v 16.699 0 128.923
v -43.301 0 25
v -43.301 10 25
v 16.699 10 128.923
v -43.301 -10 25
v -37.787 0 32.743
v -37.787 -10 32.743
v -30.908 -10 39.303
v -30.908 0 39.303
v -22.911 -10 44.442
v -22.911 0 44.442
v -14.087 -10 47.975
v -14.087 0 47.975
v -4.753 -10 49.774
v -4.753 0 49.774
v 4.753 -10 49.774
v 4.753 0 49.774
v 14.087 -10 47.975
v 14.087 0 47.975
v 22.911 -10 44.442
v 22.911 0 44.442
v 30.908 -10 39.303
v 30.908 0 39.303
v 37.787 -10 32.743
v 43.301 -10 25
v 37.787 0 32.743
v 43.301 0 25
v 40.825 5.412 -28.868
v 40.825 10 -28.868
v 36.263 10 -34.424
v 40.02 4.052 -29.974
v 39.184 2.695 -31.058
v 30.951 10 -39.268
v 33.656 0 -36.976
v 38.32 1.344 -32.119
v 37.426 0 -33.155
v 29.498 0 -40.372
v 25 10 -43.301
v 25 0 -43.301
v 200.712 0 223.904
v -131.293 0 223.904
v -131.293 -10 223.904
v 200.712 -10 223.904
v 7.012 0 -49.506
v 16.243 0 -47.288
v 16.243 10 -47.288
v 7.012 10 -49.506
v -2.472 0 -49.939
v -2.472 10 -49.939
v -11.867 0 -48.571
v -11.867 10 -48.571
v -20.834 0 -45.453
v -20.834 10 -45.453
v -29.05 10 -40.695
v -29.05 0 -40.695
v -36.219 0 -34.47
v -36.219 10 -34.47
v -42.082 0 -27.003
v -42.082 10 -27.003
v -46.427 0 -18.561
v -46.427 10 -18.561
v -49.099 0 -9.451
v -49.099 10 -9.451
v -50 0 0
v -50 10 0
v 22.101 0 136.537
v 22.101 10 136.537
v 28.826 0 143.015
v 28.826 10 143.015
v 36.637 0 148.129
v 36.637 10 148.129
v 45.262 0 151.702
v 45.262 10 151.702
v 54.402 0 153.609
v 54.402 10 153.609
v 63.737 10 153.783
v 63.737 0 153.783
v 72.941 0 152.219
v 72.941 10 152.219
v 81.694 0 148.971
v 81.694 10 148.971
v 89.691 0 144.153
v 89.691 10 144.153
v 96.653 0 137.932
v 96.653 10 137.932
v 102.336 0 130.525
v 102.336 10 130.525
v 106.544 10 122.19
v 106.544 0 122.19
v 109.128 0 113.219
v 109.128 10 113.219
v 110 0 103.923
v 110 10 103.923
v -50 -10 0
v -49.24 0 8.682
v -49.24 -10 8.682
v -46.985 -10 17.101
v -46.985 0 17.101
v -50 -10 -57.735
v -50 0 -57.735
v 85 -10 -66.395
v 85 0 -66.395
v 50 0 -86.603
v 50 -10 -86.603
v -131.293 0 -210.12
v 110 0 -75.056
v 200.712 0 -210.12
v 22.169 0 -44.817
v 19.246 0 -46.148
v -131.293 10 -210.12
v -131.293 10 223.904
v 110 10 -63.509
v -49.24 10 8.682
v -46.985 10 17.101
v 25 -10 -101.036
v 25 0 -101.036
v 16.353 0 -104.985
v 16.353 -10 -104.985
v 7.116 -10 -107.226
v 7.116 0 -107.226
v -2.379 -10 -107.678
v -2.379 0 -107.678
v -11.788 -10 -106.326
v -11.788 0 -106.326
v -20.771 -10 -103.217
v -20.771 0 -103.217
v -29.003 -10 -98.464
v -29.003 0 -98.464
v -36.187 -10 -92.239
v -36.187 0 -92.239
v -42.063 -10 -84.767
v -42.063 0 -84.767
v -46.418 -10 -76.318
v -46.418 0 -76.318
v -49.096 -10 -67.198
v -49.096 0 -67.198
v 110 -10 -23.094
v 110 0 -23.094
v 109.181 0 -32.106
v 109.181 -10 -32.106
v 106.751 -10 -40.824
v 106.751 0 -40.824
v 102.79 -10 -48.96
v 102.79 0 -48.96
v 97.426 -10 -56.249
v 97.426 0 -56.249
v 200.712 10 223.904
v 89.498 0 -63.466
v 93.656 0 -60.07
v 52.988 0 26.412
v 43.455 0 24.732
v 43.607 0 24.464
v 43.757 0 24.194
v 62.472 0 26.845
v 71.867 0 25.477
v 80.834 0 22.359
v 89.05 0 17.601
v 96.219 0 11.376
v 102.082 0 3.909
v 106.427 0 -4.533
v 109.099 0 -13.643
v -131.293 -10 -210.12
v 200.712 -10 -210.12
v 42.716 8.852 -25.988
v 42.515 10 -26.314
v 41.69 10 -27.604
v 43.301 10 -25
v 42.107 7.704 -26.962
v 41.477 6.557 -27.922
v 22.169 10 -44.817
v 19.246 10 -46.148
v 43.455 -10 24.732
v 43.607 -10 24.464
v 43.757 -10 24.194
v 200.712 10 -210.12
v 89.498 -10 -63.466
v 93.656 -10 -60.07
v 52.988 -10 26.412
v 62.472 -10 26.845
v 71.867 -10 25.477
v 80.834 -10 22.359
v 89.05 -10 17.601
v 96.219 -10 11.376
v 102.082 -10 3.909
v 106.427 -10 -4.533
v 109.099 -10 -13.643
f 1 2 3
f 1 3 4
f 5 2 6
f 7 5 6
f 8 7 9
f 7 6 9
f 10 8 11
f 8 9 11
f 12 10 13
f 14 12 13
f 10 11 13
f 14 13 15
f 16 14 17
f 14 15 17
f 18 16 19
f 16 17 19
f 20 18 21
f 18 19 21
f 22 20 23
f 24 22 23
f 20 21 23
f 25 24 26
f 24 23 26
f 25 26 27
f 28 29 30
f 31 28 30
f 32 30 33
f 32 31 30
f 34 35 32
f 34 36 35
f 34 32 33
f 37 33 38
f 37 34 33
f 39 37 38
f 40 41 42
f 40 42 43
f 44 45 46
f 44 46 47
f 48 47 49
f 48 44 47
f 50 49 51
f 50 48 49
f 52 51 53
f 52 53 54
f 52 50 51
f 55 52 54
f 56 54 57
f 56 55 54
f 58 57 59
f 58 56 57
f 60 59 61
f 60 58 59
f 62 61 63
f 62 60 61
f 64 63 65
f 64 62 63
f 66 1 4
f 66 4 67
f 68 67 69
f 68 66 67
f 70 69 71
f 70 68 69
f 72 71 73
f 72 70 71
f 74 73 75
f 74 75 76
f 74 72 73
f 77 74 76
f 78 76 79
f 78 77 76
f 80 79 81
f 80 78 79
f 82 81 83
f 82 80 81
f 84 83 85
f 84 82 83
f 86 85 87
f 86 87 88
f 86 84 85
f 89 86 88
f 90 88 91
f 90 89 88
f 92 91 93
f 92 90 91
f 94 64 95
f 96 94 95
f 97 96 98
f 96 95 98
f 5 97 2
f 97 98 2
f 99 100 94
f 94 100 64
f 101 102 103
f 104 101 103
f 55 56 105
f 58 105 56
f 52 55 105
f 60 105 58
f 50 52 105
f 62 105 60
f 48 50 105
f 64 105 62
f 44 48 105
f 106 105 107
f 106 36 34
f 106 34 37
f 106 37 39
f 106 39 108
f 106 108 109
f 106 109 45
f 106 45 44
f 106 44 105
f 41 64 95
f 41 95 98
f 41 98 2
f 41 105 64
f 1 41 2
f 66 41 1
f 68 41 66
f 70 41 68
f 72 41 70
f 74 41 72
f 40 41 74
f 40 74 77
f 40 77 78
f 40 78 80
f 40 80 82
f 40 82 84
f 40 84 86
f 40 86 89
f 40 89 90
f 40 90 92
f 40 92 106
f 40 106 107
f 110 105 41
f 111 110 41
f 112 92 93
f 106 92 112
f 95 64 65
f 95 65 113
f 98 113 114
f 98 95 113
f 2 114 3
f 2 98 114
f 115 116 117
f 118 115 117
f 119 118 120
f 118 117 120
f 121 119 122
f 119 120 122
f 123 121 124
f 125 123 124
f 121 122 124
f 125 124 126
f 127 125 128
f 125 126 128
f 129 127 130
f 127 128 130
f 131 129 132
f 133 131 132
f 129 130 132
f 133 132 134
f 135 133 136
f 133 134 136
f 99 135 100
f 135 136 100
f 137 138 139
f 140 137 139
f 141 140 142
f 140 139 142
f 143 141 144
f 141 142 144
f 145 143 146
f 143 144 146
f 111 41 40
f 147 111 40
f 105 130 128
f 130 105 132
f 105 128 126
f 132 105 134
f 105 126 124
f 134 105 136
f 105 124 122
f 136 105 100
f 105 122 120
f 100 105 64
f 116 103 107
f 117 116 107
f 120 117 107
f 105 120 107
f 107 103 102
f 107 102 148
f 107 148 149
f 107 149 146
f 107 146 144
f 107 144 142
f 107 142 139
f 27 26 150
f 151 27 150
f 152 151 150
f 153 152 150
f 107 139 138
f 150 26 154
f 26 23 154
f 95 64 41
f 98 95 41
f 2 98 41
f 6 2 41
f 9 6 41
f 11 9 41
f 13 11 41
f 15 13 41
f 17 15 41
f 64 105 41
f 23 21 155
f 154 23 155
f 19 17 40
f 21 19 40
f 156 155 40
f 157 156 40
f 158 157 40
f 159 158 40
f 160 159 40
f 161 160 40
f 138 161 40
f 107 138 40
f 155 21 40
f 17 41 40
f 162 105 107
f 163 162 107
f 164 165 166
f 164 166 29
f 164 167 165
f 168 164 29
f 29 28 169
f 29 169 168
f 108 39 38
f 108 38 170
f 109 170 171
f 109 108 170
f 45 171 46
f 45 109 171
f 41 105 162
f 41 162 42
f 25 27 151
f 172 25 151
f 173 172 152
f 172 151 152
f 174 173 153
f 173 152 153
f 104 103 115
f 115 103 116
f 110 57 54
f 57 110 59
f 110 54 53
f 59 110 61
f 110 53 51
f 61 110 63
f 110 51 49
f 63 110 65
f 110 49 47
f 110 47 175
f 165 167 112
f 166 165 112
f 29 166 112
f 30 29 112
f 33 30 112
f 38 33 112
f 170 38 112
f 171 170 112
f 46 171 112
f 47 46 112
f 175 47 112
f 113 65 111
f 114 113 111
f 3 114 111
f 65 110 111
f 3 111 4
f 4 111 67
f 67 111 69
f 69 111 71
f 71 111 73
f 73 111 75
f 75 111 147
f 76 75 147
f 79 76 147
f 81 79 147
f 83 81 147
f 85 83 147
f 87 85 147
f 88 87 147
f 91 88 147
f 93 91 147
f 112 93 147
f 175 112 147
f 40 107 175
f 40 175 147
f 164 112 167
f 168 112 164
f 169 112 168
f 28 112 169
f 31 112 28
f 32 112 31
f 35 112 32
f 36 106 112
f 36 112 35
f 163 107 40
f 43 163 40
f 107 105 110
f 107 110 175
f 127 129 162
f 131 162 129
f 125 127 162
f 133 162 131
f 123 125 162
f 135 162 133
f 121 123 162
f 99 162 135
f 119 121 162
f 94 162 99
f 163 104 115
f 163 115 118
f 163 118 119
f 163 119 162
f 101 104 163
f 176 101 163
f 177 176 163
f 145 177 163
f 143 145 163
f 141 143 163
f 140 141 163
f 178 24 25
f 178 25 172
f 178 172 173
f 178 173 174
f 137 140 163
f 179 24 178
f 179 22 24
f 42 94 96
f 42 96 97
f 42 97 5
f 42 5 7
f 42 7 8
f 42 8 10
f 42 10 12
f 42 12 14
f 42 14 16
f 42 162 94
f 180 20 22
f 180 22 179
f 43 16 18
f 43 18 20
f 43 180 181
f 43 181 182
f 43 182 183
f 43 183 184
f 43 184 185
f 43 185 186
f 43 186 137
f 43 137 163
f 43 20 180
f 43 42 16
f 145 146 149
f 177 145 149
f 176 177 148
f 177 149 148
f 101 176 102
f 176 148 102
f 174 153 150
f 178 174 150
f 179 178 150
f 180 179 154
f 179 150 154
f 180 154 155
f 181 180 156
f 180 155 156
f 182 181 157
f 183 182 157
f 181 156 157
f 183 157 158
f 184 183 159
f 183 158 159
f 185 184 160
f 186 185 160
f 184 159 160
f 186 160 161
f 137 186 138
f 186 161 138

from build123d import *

# Parameters (mm, degrees)
F0_W     = 332.0041149855
F0_H     = 434.023141861
F1_DEPTH = 10
F2_DEPTH = 10
F3_SIZE  = 9.99999


# Not quite as in the source:
# - a fillet or chamfer is up to 0.001 mm smaller than in the source, because OpenCascade refuses the exact size


with BuildPart() as f1:
    # F0 (on Front) → F1 (new body)
    with BuildSketch(Plane.XZ):
        with Locations((34.709520638, 6.8919658661)):
            Rectangle(F0_W, F0_H)
        with BuildLine():
            ThreePointArc((-50, 0), (-48.2962913145, 12.9409522551), (-43.3012701892, 25))
            Line((-43.3012701892, 25), (16.6987298108, 128.9230484541))
            ThreePointArc((16.6987298108, 128.9230484541), (72.9409522551, 152.2193397686), (110, 103.9230484541))
            Line((110, 103.9230484541), (110, -23.0940107676))
            Line((110, -23.0940107676), (110, -63.5085296109))
            Line((110, -63.5085296109), (97.4264068712, -56.2491622333))
            ThreePointArc((97.4264068712, -56.2491622333), (91.6227766017, -61.8238442297), (85, -66.3952809568))
            Line((85, -66.3952809568), (50, -86.6025403784))
            Line((50, -86.6025403784), (25, -101.0362971082))
            ThreePointArc((25, -101.0362971082), (-25, -101.0362971082), (-50, -57.735026919))
            Line((-50, -57.735026919), (-50, 0))
        make_face(mode=Mode.SUBTRACT)
        with BuildLine():
            ThreePointArc((-40.8248290464, -28.8675134595), (-47.6510306936, -15.1452723264), (-50, 0))
            Line((-50, 0), (-50, -57.735026919))
            ThreePointArc((-50, -57.735026919), (-47.6510306936, -42.5897545926), (-40.8248290464, -28.8675134595))
        make_face()
        with BuildLine():
            ThreePointArc((16.2432812114, -47.2880092147), (-15.3587691387, -47.582646107), (-40.8248290464, -28.8675134595))
            ThreePointArc((-40.8248290464, -28.8675134595), (-47.6510306936, -42.5897545926), (-50, -57.735026919))
            ThreePointArc((-50, -57.735026919), (-25, -101.0362971082), (25, -101.0362971082))
            ThreePointArc((25, -101.0362971082), (36.9417059287, -91.4293938529), (45.4124145232, -78.6566092486))
            Line((45.4124145232, -78.6566092486), (39.7196014439, -68.7963677572))
            ThreePointArc((39.7196014439, -68.7963677572), (26.2236699558, -59.9607915973), (16.2432812114, -47.2880092147))
        make_face()
        with BuildLine():
            ThreePointArc((25, -43.3012701892), (20.7177600933, -45.5057624561), (16.2432812114, -47.2880092147))
            ThreePointArc((16.2432812114, -47.2880092147), (26.2236699558, -59.9607915973), (39.7196014439, -68.7963677572))
            Line((39.7196014439, -68.7963677572), (25, -43.3012701892))
        make_face()
        with BuildLine():
            ThreePointArc((48.0277563773, -71.6395088353), (43.8111428854, -70.400679487), (39.7196014439, -68.7963677572))
            Line((39.7196014439, -68.7963677572), (45.4124145232, -78.6566092486))
            ThreePointArc((45.4124145232, -78.6566092486), (46.8516414764, -75.1970912576), (48.0277563773, -71.6395088353))
        make_face()
        with BuildLine():
            ThreePointArc((50, -57.735026919), (47.6510306936, -42.5897545926), (40.8248290464, -28.8675134595))
            ThreePointArc((40.8248290464, -28.8675134595), (33.694366934, -36.9417059287), (25, -43.3012701892))
            Line((25, -43.3012701892), (39.7196014439, -68.7963677572))
            ThreePointArc((39.7196014439, -68.7963677572), (43.8111428854, -70.400679487), (48.0277563773, -71.6395088353))
            ThreePointArc((48.0277563773, -71.6395088353), (49.5044837306, -64.756856493), (50, -57.735026919))
        make_face()
        with BuildLine():
            Line((97.4264068712, -56.2491622333), (43.3012701892, -25))
            ThreePointArc((43.3012701892, -25), (42.1074762749, -26.9622039485), (40.8248290464, -28.8675134595))
            ThreePointArc((40.8248290464, -28.8675134595), (47.6510306936, -42.5897545926), (50, -57.735026919))
            ThreePointArc((50, -57.735026919), (49.5044837306, -64.756856493), (48.0277563773, -71.6395088353))
            ThreePointArc((48.0277563773, -71.6395088353), (67.021829574, -72.5984944982), (85, -66.3952809568))
            ThreePointArc((85, -66.3952809568), (91.6227766017, -61.8238442297), (97.4264068712, -56.2491622333))
        make_face()
        with BuildLine():
            Line((50, -86.6025403784), (85, -66.3952809568))
            ThreePointArc((85, -66.3952809568), (67.021829574, -72.5984944982), (48.0277563773, -71.6395088353))
            ThreePointArc((48.0277563773, -71.6395088353), (46.8516414764, -75.1970912576), (45.4124145232, -78.6566092486))
            Line((45.4124145232, -78.6566092486), (50, -86.6025403784))
        make_face()
        with BuildLine():
            ThreePointArc((45.4124145232, -78.6566092486), (36.9417059287, -91.4293938529), (25, -101.0362971082))
            Line((25, -101.0362971082), (50, -86.6025403784))
            Line((50, -86.6025403784), (45.4124145232, -78.6566092486))
        make_face()
    extrude(amount=-F1_DEPTH)

    # F3 (size 10 in the source; OpenCascade refuses exactly that, so slightly less here)
    f3_edges = [f1.edges().sort_by_distance(p)[0] for p in [
        (76.650635, 0, -44.254265),
    ]]
    chamfer(f3_edges, length=F3_SIZE)


with BuildPart() as f2:
    # F0 (on Front) → F2 (new body)
    with BuildSketch(Plane.XZ):
        with Locations((34.709520638, 6.8919658661)):
            Rectangle(F0_W, F0_H)
        with BuildLine():
            ThreePointArc((-50, 0), (-48.2962913145, 12.9409522551), (-43.3012701892, 25))
            Line((-43.3012701892, 25), (16.6987298108, 128.9230484541))
            ThreePointArc((16.6987298108, 128.9230484541), (72.9409522551, 152.2193397686), (110, 103.9230484541))
            Line((110, 103.9230484541), (110, -23.0940107676))
            Line((110, -23.0940107676), (110, -63.5085296109))
            Line((110, -63.5085296109), (97.4264068712, -56.2491622333))
            ThreePointArc((97.4264068712, -56.2491622333), (91.6227766017, -61.8238442297), (85, -66.3952809568))
            Line((85, -66.3952809568), (50, -86.6025403784))
            Line((50, -86.6025403784), (25, -101.0362971082))
            ThreePointArc((25, -101.0362971082), (-25, -101.0362971082), (-50, -57.735026919))
            Line((-50, -57.735026919), (-50, 0))
        make_face(mode=Mode.SUBTRACT)
        with BuildLine():
            ThreePointArc((110, 103.9230484541), (72.9409522551, 152.2193397686), (16.6987298108, 128.9230484541))
            ThreePointArc((16.6987298108, 128.9230484541), (47.0590477449, 55.6267571397), (110, 103.9230484541))
        make_face()
        with BuildLine():
            ThreePointArc((-43.3012701892, 25), (0, 50), (43.3012701892, 25))
            ThreePointArc((43.3012701892, 25), (43.5308599828, 24.5980533612), (43.7567187886, 24.1939984471))
            ThreePointArc((43.7567187886, 24.1939984471), (89.0502662589, 17.6009770108), (110, -23.0940107676))
            Line((110, -23.0940107676), (110, 103.9230484541))
            ThreePointArc((110, 103.9230484541), (47.0590477449, 55.6267571397), (16.6987298108, 128.9230484541))
            Line((16.6987298108, 128.9230484541), (-43.3012701892, 25))
        make_face()
        with BuildLine():
            Line((110, -63.5085296109), (110, -23.0940107676))
            ThreePointArc((110, -23.0940107676), (106.7510446063, -40.8236421292), (97.4264068712, -56.2491622333))
            Line((97.4264068712, -56.2491622333), (110, -63.5085296109))
        make_face()
    extrude(amount=F2_DEPTH)


solid = Compound([f1.part, f2.part])
